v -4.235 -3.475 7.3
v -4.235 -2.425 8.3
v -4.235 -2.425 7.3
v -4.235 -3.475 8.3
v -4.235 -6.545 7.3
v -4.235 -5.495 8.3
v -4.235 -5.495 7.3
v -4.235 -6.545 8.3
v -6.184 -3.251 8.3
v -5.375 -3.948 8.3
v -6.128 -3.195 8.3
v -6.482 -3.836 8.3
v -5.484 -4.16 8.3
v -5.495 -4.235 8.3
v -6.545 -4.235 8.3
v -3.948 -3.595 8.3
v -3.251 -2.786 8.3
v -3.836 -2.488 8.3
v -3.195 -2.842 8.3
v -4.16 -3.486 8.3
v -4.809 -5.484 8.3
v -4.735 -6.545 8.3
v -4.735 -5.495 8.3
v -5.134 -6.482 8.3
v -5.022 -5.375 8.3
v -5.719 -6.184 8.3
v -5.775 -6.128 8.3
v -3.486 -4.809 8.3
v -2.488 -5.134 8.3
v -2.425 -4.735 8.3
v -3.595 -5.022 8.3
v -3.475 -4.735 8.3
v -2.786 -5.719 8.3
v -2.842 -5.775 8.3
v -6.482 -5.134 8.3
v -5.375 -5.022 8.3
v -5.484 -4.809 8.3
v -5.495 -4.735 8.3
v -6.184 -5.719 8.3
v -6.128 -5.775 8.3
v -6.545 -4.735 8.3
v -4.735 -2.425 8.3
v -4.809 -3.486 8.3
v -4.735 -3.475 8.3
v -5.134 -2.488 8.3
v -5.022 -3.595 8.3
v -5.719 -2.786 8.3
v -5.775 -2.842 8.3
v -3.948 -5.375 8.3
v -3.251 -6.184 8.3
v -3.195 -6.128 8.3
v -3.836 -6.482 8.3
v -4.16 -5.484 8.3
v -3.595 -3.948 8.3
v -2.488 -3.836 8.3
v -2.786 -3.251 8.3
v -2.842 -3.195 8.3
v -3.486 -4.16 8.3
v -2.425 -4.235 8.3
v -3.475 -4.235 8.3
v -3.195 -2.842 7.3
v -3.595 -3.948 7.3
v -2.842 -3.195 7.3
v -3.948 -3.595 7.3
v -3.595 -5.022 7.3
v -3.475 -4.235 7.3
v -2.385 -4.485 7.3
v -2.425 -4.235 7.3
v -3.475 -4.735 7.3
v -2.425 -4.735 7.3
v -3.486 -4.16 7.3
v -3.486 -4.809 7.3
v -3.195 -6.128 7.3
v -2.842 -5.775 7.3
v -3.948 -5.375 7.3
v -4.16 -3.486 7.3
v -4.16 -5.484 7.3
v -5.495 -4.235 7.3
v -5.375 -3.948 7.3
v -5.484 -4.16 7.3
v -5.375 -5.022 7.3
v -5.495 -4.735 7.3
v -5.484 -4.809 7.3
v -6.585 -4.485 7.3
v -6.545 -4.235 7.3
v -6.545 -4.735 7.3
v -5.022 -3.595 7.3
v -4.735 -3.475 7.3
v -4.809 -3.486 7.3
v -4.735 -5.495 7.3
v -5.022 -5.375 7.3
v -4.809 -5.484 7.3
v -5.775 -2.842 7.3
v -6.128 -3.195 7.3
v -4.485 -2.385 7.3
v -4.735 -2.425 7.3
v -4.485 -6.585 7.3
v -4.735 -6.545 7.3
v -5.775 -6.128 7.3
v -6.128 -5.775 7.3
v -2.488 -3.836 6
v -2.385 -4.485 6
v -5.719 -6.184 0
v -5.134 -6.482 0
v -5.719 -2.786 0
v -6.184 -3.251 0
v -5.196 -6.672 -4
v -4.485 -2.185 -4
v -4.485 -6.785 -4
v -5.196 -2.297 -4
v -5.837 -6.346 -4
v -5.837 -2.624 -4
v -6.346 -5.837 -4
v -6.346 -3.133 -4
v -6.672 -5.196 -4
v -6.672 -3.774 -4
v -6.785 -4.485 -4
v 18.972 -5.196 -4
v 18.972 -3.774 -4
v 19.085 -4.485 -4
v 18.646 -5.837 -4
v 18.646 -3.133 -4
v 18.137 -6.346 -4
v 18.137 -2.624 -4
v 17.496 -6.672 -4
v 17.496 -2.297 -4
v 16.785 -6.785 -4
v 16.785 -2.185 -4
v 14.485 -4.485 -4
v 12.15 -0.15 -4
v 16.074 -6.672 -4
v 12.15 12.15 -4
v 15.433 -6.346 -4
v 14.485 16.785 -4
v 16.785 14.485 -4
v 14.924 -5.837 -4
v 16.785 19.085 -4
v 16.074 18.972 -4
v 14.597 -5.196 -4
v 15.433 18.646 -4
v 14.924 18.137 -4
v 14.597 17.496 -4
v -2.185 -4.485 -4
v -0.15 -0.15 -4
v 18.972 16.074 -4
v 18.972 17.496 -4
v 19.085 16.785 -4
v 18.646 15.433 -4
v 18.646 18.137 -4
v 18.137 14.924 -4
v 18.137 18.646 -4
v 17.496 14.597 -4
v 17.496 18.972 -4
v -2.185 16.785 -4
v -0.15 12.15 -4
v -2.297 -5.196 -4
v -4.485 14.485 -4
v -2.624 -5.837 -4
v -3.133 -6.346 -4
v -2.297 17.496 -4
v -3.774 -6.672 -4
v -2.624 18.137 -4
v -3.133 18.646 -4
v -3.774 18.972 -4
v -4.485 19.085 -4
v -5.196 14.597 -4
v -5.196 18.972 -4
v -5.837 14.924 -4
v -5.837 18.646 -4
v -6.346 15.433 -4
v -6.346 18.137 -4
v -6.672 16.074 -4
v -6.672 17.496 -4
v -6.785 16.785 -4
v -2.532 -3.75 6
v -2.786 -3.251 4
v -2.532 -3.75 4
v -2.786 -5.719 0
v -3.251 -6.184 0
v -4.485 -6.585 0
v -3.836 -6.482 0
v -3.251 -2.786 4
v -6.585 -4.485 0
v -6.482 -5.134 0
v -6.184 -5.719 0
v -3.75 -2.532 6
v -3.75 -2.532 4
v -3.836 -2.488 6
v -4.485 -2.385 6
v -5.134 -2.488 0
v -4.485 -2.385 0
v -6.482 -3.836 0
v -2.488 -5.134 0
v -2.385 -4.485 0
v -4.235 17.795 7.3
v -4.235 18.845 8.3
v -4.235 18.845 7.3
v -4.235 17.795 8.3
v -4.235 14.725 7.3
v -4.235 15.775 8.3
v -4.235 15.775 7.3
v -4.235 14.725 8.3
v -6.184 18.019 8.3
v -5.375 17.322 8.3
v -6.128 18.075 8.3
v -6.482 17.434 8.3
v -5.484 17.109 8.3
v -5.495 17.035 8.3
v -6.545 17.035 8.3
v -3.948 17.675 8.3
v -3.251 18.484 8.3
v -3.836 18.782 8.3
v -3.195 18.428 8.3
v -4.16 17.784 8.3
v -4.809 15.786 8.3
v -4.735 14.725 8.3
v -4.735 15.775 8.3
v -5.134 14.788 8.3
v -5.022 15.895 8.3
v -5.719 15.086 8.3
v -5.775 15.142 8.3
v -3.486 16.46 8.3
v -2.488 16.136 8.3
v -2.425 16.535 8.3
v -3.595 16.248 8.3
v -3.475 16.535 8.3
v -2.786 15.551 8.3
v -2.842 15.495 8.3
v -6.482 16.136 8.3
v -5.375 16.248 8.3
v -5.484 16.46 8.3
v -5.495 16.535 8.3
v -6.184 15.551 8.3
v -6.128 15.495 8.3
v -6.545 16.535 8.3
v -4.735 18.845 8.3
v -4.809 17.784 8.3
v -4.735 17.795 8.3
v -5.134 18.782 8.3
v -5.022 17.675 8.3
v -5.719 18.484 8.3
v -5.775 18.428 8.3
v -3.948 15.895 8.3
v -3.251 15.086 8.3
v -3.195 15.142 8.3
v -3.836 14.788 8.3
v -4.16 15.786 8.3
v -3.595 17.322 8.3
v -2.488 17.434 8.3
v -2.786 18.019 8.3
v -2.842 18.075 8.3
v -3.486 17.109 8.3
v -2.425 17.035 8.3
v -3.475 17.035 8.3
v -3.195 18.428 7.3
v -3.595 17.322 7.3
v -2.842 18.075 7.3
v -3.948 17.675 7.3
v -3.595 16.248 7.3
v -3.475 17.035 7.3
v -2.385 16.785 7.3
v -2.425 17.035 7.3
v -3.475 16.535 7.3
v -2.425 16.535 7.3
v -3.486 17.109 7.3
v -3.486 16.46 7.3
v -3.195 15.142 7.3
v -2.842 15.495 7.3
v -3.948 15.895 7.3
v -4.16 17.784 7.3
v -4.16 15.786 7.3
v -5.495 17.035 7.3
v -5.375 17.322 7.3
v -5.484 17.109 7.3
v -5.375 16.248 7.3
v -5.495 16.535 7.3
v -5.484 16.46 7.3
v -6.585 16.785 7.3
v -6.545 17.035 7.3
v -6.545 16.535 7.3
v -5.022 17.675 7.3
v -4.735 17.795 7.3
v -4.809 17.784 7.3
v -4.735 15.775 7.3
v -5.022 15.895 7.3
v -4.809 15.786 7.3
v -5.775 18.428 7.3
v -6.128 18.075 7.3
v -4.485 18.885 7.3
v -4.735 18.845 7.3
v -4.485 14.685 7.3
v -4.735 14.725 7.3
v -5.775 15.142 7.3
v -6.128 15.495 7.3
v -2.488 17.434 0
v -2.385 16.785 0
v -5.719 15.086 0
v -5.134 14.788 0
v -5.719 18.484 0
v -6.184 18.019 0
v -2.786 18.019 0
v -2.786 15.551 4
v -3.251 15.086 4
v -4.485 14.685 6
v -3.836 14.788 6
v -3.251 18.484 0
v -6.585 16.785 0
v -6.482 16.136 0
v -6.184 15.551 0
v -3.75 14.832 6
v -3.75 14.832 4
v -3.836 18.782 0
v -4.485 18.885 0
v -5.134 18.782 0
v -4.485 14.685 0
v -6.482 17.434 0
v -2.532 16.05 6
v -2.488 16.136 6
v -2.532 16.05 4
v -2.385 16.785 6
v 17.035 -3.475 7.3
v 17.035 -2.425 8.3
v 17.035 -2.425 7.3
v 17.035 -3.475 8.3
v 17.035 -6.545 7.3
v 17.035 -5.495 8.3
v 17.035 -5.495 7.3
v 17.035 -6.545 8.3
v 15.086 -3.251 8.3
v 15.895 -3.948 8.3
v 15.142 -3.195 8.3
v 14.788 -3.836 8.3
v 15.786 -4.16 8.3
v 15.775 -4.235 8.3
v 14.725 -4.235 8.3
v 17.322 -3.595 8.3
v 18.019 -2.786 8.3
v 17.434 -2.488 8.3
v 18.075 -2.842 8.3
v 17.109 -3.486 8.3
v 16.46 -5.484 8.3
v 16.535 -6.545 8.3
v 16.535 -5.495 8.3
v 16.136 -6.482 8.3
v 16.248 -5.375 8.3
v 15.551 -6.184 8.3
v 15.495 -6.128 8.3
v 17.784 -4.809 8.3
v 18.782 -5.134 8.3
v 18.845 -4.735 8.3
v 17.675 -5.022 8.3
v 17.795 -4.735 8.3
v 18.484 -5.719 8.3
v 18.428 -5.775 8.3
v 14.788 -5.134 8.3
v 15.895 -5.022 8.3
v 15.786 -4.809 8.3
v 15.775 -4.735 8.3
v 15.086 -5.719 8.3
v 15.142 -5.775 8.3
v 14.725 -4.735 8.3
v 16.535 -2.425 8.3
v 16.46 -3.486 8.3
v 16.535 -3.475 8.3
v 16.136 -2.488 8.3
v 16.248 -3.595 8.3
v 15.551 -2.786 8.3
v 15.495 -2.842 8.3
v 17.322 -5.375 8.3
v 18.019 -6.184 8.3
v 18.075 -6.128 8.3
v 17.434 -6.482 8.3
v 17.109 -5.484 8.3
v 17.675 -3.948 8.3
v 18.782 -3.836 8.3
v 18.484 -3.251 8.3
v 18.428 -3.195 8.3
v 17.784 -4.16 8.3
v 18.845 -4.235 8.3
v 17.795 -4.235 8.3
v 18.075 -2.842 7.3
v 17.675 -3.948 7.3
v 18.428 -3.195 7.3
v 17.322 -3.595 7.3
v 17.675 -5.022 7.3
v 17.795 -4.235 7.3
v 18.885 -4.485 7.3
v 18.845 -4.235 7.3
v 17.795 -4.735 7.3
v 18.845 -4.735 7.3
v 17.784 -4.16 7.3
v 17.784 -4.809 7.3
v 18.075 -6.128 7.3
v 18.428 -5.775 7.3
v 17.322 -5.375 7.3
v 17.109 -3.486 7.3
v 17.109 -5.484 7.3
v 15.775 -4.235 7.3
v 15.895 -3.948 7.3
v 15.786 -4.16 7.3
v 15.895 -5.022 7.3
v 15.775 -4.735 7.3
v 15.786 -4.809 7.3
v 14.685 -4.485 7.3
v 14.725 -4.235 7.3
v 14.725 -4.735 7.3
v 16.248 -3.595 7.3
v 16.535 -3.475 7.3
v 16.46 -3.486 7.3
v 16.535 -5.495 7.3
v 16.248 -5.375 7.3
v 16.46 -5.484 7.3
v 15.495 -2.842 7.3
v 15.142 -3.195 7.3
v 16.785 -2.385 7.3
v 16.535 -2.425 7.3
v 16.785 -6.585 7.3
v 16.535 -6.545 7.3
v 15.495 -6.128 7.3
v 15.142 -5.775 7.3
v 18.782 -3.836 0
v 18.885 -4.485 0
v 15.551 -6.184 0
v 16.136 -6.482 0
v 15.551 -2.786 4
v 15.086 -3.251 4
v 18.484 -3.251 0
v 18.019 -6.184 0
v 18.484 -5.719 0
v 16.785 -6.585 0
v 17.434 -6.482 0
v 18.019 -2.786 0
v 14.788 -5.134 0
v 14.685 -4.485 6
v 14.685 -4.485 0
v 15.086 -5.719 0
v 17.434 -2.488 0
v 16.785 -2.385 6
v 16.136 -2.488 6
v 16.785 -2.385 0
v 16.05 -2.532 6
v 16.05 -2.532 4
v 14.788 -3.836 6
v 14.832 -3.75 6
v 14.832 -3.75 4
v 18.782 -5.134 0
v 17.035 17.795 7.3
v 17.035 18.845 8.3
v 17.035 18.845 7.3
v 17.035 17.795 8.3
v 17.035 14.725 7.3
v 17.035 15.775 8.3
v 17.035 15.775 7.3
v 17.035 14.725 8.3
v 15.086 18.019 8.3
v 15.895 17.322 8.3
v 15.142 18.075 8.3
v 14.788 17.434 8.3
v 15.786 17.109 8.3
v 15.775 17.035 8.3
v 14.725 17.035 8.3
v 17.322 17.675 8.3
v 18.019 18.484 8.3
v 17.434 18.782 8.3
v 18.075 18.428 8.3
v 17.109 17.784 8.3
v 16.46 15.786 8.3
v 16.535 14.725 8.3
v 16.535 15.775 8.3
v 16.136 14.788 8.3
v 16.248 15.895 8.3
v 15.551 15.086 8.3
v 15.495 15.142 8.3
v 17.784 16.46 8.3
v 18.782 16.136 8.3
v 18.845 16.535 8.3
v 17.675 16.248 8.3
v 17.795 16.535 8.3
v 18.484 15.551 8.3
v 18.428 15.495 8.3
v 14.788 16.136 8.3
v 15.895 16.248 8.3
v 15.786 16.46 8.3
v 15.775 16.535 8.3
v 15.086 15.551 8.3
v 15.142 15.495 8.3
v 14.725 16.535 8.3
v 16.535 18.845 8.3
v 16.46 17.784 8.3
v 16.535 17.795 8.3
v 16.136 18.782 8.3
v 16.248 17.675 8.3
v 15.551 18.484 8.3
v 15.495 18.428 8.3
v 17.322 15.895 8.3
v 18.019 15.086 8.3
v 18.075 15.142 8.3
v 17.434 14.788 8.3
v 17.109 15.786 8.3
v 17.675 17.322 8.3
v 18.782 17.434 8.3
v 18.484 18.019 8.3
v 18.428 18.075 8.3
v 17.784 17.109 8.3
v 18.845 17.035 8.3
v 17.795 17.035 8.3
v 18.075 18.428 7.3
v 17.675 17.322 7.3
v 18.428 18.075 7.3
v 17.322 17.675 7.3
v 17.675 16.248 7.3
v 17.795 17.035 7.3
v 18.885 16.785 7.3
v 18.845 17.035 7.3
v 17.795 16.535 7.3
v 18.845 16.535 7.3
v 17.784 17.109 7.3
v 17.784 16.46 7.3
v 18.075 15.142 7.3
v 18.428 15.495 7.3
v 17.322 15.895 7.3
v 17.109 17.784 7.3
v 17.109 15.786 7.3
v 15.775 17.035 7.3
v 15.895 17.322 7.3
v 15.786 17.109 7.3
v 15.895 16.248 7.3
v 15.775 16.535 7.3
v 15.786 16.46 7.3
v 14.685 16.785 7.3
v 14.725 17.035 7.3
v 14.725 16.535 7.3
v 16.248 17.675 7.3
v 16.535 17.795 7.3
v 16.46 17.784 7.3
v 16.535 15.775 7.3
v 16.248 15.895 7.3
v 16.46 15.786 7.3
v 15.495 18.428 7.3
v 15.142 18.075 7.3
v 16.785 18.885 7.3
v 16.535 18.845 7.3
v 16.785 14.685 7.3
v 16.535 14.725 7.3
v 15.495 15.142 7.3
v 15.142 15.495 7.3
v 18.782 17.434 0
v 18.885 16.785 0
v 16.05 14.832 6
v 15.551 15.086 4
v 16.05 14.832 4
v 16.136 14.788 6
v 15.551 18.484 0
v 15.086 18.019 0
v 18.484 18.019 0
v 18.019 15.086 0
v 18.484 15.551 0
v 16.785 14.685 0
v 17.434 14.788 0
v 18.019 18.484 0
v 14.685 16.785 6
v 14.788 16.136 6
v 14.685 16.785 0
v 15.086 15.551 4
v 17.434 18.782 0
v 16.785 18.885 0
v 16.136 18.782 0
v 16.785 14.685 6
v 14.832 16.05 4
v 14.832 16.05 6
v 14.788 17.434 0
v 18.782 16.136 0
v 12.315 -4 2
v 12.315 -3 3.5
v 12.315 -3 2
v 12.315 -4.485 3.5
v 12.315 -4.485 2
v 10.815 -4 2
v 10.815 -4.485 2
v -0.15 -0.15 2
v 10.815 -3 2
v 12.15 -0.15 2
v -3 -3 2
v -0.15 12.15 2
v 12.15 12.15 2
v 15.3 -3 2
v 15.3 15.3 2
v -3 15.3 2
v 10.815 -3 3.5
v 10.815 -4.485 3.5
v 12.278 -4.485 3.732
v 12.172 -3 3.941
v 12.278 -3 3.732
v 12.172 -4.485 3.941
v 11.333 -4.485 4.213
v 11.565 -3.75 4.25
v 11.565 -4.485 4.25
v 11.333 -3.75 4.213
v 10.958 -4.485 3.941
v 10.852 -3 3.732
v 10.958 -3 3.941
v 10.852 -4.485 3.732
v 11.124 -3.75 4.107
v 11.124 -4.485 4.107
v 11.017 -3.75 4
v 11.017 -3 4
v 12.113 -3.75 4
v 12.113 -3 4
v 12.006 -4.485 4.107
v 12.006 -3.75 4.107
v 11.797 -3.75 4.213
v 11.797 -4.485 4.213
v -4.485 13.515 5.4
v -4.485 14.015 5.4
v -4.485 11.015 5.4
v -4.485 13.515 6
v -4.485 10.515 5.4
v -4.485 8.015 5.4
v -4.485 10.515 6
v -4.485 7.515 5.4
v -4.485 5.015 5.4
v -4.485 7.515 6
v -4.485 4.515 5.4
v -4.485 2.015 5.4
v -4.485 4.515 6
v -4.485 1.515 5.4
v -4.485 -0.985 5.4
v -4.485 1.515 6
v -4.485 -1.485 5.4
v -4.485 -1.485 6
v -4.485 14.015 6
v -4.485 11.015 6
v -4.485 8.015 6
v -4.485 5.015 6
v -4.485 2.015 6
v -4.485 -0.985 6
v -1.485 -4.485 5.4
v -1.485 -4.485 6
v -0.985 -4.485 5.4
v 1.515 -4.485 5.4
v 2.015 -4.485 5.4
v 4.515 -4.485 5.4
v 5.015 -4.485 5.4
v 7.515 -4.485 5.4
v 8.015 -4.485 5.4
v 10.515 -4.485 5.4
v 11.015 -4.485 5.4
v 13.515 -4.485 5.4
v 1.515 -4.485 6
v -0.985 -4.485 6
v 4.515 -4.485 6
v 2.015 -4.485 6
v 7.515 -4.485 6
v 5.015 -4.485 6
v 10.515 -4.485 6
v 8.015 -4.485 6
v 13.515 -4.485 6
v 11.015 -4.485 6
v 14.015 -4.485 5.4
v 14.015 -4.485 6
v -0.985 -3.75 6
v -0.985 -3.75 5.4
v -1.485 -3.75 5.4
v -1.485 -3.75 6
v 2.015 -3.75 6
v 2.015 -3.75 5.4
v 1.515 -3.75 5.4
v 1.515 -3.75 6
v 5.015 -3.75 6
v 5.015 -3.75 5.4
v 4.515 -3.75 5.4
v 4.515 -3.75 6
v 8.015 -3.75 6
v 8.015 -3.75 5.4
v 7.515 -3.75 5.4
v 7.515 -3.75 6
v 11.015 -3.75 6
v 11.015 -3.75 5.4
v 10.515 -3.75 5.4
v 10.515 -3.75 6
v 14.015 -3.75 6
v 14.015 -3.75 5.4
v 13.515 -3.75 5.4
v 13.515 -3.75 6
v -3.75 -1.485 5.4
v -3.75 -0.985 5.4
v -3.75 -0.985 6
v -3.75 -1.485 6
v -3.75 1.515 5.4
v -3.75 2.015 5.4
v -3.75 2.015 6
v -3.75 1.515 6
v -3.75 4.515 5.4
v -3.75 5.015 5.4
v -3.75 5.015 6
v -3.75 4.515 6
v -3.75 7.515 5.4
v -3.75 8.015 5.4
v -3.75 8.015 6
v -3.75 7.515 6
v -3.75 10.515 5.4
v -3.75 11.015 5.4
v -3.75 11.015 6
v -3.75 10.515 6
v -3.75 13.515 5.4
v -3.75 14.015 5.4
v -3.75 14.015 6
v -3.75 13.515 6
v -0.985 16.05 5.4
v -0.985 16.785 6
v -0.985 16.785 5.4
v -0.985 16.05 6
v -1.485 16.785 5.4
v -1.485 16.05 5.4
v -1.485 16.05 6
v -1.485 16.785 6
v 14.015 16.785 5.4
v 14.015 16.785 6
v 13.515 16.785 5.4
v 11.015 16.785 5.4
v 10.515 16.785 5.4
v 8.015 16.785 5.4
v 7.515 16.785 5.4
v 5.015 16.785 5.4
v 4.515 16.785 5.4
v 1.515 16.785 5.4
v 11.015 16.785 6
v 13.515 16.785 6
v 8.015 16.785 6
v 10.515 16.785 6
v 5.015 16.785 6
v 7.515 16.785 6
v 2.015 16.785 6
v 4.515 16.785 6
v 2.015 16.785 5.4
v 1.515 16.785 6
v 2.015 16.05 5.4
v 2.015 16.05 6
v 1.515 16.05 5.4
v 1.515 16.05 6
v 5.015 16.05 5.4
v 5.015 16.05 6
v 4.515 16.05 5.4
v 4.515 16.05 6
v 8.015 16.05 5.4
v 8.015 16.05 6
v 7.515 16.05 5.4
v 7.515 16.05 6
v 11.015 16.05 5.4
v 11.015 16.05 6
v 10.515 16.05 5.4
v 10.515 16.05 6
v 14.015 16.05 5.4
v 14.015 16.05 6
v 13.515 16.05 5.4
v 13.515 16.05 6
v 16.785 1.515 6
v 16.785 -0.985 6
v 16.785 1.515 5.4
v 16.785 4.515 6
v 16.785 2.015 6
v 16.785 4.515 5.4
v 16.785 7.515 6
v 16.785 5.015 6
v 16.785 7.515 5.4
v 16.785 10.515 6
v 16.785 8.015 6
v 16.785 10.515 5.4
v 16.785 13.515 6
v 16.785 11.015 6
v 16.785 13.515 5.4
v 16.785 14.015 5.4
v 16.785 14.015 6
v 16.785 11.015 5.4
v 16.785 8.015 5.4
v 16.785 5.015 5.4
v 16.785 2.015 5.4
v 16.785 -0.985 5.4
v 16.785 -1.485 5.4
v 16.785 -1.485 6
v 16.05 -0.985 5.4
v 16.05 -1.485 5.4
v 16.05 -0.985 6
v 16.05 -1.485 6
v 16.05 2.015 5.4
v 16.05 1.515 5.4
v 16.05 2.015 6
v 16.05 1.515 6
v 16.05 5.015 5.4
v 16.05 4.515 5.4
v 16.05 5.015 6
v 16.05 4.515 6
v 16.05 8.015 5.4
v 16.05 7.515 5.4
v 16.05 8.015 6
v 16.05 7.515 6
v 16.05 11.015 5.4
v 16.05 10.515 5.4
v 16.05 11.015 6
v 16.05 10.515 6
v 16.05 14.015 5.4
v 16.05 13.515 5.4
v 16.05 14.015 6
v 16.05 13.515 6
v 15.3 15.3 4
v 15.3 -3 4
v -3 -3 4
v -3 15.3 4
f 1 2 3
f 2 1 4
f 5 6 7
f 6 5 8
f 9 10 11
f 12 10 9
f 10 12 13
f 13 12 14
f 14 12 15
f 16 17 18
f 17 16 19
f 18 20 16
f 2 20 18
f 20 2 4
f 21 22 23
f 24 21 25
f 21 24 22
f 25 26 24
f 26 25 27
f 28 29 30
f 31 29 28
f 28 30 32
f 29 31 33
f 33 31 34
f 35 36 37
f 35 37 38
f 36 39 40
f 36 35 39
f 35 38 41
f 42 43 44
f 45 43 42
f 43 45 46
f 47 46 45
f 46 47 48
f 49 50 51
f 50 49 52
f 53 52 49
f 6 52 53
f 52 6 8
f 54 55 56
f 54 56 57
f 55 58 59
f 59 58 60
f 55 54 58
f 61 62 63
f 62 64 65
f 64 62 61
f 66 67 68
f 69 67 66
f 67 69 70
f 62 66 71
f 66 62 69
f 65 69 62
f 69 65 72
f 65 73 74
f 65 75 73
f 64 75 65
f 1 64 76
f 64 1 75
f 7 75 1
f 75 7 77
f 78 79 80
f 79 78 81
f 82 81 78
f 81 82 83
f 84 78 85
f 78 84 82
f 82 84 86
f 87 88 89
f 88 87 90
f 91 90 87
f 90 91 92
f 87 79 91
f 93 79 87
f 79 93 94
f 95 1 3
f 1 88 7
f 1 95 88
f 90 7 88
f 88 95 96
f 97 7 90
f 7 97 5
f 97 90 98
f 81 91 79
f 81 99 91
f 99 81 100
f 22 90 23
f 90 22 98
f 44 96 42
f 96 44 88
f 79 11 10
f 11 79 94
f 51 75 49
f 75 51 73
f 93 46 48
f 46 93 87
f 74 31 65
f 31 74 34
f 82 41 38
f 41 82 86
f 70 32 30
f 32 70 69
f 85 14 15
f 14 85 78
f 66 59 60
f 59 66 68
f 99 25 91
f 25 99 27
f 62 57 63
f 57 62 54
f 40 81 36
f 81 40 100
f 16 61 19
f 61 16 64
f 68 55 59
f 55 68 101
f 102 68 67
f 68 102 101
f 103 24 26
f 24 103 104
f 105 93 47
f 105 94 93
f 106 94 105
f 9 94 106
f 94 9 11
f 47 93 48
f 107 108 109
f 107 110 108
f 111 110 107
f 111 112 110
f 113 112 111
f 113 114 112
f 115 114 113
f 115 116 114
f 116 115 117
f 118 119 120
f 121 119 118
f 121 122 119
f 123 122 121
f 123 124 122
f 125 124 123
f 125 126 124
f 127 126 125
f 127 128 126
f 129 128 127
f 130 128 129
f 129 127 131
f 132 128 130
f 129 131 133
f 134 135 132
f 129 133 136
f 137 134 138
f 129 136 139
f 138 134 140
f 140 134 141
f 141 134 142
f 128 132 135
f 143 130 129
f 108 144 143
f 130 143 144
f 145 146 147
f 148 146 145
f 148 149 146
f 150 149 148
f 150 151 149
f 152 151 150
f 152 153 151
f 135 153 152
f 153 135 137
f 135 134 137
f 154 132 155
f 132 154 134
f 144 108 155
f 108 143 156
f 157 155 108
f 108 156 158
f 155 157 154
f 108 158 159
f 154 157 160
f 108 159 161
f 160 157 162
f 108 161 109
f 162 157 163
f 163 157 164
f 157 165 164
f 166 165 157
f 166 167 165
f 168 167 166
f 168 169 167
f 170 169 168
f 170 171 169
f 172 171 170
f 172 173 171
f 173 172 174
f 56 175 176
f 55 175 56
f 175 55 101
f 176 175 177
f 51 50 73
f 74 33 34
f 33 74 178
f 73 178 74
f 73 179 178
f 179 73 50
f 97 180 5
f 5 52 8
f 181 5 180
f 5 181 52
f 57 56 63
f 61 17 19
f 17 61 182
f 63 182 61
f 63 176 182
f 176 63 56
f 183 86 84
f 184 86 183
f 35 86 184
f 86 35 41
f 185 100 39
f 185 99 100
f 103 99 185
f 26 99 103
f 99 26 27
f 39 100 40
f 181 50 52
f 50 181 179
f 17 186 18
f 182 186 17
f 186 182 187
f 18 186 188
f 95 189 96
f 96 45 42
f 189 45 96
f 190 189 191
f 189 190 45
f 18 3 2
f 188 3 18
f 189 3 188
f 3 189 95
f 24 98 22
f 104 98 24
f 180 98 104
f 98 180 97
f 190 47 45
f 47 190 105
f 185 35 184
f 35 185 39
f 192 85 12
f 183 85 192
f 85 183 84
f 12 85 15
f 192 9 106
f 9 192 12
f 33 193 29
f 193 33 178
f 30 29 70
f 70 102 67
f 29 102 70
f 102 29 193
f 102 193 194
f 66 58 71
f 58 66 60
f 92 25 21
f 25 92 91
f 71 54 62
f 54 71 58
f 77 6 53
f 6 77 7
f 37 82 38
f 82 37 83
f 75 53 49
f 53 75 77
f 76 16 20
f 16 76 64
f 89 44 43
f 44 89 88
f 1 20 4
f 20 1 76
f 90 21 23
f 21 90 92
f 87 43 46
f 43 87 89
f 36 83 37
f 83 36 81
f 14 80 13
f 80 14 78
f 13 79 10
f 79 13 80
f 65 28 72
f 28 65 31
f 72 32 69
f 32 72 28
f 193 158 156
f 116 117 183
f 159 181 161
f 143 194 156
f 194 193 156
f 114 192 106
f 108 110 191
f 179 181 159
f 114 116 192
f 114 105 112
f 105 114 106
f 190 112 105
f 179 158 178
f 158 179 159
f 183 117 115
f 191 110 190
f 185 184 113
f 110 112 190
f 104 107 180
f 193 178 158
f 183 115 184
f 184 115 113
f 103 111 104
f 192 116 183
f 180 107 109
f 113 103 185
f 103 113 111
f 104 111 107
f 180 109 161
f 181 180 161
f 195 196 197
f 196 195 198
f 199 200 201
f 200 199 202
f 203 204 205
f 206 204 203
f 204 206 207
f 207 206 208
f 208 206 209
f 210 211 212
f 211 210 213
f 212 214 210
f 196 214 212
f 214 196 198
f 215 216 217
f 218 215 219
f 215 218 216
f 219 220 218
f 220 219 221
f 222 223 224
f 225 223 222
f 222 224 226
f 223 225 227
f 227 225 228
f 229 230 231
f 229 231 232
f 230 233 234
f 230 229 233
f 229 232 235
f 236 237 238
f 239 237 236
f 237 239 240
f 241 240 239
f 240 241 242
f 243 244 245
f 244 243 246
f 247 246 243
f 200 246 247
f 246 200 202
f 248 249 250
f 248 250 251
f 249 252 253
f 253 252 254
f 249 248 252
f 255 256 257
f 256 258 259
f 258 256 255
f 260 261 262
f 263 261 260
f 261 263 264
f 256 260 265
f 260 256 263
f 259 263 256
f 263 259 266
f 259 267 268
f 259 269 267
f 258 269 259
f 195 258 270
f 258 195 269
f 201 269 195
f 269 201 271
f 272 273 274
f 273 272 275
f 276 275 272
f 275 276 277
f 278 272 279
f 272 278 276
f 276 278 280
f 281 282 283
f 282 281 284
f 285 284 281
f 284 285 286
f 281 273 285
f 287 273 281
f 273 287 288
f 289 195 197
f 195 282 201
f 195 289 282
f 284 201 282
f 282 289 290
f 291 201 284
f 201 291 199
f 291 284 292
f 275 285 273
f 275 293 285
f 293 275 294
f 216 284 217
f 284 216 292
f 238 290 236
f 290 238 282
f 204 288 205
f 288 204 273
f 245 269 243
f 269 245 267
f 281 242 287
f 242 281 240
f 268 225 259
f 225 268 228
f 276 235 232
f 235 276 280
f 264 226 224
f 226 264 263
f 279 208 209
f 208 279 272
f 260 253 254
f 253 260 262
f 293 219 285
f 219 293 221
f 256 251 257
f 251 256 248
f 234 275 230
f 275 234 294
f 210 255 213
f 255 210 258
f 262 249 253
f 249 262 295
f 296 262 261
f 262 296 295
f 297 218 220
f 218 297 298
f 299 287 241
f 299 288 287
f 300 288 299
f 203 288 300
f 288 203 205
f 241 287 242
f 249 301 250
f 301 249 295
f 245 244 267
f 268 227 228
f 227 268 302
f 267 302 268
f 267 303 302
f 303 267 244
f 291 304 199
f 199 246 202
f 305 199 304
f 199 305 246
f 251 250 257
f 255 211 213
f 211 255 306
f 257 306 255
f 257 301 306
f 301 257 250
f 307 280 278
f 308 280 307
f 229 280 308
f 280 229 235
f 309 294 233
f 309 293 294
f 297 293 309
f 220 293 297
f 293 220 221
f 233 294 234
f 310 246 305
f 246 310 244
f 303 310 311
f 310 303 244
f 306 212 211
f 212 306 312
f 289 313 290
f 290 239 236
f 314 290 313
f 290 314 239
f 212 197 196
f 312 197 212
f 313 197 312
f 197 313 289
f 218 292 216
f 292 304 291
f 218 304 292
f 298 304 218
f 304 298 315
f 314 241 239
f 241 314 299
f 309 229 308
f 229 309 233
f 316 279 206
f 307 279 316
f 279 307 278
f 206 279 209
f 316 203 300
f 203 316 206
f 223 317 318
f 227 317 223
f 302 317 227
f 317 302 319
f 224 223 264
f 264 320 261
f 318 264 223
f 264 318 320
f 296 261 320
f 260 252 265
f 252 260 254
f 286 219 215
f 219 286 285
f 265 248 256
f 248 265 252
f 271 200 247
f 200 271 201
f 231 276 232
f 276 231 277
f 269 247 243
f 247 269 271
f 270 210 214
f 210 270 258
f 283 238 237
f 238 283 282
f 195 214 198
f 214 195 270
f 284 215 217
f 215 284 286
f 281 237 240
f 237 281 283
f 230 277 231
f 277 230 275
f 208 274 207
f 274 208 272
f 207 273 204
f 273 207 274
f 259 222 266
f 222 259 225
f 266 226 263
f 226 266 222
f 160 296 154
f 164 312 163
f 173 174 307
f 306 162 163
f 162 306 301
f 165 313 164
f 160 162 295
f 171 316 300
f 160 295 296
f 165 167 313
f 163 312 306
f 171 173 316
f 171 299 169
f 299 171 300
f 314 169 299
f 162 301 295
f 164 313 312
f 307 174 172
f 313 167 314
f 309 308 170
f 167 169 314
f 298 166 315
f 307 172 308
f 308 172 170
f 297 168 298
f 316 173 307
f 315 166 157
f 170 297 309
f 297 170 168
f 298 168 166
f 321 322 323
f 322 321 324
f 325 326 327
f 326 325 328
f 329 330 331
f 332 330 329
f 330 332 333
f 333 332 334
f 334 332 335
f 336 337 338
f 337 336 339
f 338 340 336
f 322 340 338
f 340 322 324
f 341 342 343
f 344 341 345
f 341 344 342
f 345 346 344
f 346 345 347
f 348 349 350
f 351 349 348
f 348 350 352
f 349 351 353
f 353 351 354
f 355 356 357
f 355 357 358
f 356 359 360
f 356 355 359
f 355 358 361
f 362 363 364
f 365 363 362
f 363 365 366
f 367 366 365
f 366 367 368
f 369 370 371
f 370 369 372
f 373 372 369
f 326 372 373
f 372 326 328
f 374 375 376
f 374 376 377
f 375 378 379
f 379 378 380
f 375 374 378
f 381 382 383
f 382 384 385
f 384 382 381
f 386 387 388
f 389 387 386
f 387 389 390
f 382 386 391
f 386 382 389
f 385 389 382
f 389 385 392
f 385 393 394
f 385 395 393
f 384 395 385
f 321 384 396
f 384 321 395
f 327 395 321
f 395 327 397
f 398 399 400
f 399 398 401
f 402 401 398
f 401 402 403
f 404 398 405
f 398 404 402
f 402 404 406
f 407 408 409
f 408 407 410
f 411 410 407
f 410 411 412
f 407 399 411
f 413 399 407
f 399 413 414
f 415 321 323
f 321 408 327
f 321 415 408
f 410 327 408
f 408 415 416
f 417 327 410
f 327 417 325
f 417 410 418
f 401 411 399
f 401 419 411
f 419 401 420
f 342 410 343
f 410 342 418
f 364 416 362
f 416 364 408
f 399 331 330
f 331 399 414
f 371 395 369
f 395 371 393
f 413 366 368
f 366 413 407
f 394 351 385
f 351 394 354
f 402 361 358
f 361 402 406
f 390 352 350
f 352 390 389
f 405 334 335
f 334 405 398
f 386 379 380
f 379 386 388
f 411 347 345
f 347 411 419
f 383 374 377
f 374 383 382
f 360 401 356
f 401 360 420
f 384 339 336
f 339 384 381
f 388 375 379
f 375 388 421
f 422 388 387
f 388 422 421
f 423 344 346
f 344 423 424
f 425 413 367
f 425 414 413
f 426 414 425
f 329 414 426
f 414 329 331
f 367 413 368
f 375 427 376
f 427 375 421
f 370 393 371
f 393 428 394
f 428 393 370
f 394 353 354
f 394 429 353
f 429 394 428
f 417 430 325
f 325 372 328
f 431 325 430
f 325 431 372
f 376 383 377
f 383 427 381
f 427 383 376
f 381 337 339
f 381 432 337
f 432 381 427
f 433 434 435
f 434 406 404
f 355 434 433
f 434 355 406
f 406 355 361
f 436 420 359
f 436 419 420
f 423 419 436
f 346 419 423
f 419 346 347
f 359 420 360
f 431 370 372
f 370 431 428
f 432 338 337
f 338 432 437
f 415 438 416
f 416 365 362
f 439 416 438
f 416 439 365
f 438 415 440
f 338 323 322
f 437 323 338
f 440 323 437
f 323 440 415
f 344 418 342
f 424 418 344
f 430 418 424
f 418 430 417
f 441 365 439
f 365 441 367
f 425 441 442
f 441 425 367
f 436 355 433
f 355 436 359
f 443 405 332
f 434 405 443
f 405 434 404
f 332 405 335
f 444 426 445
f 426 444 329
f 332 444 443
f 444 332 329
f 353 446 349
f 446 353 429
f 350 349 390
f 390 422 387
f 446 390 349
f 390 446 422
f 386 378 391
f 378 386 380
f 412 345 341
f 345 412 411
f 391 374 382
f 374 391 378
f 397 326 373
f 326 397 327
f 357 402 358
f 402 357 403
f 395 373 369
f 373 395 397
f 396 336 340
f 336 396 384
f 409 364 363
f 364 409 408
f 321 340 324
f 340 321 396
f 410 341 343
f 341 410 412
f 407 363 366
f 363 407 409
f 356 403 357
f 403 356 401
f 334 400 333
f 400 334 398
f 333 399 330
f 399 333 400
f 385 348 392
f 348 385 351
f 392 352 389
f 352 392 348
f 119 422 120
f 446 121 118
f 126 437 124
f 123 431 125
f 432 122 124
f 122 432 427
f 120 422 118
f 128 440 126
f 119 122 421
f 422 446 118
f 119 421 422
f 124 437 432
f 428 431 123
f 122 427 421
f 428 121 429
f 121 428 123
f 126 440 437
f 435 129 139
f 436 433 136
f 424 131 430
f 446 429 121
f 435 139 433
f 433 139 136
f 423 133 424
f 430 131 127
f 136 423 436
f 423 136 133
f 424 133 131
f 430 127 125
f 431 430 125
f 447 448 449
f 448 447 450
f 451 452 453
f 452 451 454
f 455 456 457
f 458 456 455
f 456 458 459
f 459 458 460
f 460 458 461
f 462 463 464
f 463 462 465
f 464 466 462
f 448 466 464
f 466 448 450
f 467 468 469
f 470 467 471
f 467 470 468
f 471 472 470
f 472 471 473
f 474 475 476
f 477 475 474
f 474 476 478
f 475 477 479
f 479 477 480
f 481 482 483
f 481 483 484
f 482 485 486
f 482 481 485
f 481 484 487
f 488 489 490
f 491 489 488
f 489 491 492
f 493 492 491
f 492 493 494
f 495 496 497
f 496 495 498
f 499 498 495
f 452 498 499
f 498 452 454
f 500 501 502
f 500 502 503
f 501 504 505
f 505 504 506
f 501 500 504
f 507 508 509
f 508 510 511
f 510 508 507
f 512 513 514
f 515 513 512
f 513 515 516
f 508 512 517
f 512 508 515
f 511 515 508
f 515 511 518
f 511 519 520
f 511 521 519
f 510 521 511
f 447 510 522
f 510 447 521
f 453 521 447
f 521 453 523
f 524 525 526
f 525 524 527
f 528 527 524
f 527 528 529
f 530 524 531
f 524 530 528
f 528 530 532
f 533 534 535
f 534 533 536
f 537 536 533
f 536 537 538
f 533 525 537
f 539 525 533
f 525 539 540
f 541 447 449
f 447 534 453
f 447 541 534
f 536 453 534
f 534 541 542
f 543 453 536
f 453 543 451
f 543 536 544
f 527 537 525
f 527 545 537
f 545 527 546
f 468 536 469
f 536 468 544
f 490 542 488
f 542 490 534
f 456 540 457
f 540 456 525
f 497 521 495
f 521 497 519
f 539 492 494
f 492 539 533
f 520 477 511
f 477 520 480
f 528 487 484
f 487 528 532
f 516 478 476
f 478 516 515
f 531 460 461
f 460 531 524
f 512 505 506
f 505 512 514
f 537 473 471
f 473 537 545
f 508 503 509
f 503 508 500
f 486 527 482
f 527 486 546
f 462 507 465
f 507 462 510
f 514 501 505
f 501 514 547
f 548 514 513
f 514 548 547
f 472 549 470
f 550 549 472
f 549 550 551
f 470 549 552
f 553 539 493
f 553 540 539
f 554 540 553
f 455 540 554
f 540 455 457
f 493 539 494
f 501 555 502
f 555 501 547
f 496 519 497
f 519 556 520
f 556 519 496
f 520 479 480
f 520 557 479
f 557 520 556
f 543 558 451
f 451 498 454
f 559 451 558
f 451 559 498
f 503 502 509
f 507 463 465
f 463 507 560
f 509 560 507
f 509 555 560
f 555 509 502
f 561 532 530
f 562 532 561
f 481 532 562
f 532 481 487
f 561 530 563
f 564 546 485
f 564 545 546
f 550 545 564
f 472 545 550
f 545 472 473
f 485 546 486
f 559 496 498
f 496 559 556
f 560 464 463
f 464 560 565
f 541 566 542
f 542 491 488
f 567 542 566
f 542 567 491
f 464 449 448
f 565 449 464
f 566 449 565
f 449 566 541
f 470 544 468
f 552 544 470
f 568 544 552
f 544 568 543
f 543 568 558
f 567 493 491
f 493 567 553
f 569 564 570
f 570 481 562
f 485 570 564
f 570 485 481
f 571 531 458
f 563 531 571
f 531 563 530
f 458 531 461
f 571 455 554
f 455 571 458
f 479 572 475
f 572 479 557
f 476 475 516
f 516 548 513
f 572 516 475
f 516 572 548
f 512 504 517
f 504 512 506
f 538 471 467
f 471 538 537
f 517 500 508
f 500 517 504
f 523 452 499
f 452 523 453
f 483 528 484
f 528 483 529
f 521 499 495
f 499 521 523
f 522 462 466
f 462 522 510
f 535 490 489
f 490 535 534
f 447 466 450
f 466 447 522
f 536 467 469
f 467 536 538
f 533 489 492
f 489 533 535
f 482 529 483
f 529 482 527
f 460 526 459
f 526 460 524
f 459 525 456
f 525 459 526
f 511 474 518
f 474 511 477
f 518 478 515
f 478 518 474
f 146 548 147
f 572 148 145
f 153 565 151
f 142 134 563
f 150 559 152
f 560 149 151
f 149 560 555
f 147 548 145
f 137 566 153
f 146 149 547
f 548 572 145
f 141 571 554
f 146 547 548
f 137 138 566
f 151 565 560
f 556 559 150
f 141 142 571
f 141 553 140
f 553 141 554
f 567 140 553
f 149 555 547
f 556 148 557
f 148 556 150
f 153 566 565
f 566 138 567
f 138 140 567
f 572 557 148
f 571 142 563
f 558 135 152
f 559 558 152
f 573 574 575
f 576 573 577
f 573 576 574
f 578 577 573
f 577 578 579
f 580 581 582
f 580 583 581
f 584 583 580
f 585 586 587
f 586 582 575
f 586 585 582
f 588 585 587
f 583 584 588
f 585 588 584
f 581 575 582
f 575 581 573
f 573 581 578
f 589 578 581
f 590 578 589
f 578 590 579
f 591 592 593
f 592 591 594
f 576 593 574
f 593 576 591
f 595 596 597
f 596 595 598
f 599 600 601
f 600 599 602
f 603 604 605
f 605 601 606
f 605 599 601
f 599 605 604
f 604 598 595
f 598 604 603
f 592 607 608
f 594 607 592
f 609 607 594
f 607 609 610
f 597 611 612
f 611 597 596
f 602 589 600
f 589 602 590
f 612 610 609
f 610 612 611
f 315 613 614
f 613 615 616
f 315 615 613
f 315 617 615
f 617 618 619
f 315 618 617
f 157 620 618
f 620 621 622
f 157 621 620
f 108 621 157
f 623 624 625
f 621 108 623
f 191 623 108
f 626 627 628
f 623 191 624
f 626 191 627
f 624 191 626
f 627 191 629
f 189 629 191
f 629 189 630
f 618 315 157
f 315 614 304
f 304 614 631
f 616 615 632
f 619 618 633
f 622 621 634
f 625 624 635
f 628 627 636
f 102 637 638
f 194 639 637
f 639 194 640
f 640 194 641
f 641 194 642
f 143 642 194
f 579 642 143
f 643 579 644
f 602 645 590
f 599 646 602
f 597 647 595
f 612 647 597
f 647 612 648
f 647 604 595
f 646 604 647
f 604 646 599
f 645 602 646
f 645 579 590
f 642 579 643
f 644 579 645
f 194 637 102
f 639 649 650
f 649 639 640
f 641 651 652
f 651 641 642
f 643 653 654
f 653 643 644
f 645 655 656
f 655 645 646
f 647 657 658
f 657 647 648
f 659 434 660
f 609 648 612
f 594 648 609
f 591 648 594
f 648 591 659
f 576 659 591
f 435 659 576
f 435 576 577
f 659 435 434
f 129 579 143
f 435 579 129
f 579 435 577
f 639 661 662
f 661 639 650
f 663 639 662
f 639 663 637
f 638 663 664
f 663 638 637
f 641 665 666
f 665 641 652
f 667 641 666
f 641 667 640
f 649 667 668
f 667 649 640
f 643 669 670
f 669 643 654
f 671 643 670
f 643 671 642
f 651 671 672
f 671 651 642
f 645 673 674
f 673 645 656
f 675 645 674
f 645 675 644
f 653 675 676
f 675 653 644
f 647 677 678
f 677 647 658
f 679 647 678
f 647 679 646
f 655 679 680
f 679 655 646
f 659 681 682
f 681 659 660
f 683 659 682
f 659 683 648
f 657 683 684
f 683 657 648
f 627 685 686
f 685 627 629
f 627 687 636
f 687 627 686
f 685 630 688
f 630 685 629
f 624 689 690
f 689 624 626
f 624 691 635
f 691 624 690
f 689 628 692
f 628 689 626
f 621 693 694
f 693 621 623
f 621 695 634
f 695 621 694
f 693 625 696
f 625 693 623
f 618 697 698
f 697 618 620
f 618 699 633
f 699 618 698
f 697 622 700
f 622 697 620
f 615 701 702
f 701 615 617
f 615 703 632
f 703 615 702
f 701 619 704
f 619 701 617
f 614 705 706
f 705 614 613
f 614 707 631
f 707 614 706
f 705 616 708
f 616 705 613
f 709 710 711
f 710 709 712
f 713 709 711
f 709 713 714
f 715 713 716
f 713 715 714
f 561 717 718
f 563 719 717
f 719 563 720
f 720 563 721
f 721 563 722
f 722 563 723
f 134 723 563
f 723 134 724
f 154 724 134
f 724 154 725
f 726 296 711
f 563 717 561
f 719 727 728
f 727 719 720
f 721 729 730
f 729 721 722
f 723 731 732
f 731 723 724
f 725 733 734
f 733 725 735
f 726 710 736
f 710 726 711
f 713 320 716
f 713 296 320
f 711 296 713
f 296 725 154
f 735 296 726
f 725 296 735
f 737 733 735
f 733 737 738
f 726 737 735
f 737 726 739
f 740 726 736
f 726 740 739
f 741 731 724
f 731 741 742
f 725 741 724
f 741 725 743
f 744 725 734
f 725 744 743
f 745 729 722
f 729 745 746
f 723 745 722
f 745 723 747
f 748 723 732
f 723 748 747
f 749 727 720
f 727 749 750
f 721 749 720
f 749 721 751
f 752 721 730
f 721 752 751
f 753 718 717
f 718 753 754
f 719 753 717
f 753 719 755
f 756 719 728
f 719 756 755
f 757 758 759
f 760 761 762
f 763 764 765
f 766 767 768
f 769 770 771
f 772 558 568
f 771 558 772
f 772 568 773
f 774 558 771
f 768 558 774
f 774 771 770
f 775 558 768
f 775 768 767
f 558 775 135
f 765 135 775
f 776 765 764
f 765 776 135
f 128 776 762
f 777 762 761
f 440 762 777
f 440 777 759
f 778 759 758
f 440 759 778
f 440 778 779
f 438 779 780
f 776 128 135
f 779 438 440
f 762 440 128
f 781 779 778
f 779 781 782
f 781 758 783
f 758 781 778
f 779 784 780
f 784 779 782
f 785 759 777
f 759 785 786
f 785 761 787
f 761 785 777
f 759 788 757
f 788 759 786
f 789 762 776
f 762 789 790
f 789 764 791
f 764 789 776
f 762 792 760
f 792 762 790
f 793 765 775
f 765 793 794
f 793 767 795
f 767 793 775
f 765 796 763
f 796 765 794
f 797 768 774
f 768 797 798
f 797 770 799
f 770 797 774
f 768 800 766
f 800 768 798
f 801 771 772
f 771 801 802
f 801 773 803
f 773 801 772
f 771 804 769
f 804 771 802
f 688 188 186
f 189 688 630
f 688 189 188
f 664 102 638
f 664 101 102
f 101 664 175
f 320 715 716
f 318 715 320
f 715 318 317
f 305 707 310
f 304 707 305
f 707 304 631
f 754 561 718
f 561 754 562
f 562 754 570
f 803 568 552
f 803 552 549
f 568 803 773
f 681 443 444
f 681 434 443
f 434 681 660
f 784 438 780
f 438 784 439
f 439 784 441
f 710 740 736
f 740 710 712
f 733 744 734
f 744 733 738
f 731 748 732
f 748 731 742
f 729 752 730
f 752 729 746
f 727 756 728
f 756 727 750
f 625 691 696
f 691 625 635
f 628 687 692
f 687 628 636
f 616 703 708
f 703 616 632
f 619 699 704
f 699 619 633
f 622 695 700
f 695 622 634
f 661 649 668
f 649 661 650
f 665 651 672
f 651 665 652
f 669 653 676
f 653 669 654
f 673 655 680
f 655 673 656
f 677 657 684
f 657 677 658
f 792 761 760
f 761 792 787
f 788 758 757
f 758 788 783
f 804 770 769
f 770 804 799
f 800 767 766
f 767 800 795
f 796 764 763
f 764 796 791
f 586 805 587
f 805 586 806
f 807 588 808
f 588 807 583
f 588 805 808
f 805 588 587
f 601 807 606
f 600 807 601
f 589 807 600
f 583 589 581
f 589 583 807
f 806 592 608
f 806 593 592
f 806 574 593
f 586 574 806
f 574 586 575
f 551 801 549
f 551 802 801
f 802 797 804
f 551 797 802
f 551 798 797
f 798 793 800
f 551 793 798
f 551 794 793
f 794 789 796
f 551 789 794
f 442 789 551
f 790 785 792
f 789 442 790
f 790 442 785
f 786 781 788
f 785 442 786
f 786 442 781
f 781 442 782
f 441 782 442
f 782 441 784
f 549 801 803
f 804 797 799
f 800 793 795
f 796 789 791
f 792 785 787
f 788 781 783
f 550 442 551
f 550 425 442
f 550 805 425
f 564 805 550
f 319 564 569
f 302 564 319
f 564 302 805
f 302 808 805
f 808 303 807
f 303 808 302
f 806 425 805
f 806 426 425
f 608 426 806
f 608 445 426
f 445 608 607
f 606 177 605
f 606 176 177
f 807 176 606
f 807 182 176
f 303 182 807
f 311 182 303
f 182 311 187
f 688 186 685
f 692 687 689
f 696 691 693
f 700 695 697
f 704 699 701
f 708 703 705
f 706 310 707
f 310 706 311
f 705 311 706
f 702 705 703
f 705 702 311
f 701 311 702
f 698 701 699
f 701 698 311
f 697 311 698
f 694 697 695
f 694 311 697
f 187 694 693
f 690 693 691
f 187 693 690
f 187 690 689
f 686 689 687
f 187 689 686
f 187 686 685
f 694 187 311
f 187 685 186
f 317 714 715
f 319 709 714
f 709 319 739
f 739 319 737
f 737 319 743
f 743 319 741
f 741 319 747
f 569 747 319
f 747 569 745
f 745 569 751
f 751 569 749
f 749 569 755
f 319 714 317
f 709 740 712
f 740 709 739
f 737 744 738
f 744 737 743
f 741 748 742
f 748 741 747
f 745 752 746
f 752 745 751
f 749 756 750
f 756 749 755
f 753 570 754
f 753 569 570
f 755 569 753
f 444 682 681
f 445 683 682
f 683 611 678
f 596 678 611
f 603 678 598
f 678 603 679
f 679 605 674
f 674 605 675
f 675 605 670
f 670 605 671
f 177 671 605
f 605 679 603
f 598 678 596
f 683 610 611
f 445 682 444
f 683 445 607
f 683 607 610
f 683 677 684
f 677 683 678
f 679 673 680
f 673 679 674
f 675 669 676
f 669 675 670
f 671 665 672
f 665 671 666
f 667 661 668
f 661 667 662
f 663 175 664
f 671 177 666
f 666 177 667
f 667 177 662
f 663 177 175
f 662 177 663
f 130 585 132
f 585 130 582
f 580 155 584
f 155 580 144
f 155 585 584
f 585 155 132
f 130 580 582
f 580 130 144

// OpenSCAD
radio = 4.2/2;
ancho=sqrt(2*radio*radio);
rTH=17; //sqrt(2*pow(2,12.3))/2;
ladoAlmTH = 12.3/15;
dCubo=3+radio*sin(45);//+radio;sqrt(2*3*3);

module torre_homenaje(){
//
	
	difference(){
		cube(size=[12.3,12.3,22.7+4]);
		translate([2/2,2/2,-1])agujeroTH();//cube(size=[12.3-3,12.3-3,22.7-2]);
		translate([12.3/2-1.5/2,-ancho/2,22.7/3*2])
			union(){
				cube(size=[1.5,5,1.5]);
				translate([1.5/2,5,1.5])rotate([90,0,0])lobulada(radio=1.3/2);
			}		
	}
	translate([0,0,22.7+4])almenasTH();


}

module cubo(){
	difference(){
		cylinder(h = 8.30+4, r = radio, center = false, $fn=20);
		for ( i = [0 : 7] )
		{
			rotate([0,0,i*45])translate([0,0,7.8+4])cube(size=[.5,radio*6,1],center=true);
		}
		translate([0,0,7.3+4])cylinder(h = 8.30, r = radio/2, center = false, $fn=20);
	}
	translate([0,0,-0])cylinder(h = 4, r1= radio + .2, r2 = radio, center = false, $fn=20);
}

module muralla(puente=true){
	difference(){
		cube(size=[12.3+dCubo*2,12.3+dCubo*2,6+4]);
		translate([ancho/2,ancho/2,-50])cube(size=[12.3+dCubo*2-ancho,12.3+dCubo*2-ancho,100]);
		translate([ancho/2-0.75,ancho/2-0.75,4+4])cube(size=[12.3+dCubo*2-ancho+1.5,12.3+dCubo*2-ancho+1.5,100]);
		translate([12.3+dCubo*2-ancho-3,-ancho/2,2+4])
			union(){
				cube(size=[1.5,5,1.5]);
				translate([1.5/2,5,1.5])rotate([90,0,0])cylinder(h=5,r=1.5/2,$fn=20);
			}	

		translate([0,0,4])agujerosMuralla();
	}
	
    //puente
    if (puente)
        translate([12.3+dCubo*2-ancho-3,-4.3,1.65+4])rotate([2,0,0])cube(size=[1.5,4.8,0.2]);
}



module castillo(){
    translate([-0.15,-0.15,-4])torre_homenaje();
	castilloSinTorre();

}
module castilloSinTorre(puente=true){
	translate([-dCubo,-dCubo,-4]) cubo();
	translate([-dCubo,12.3 + dCubo,-4]) cubo();
	translate([12.3 + dCubo,-dCubo,-4]) cubo();
	translate([12.3 + dCubo,12.3 + dCubo,-4]) cubo();
	translate([-dCubo,-dCubo,-4])muralla(puente);

    // la tierra entre el cubo y la muralla TODO hacerla paramétrica
    translate([6,6,-1])difference(){
		cube(size=[20,20,6],center=true);
		cube(size=[12.3,12.3,60],center=true);
	}

}

module almenaTH(){
	cube(size=[ladoAlmTH,ladoAlmTH,1]);
	polyhedron(
  points=[ [0,0,1],[ladoAlmTH,0,1],[ladoAlmTH,ladoAlmTH,1],[0,ladoAlmTH,1], // the four points at base
           [ladoAlmTH/2,ladoAlmTH/2,1.7]  ],                                 // the apexont 
faces=[ [0,1,4],[1,2,4],[2,3,4],[3,0,4],          // each triangle side
              [1,0,3],[2,1,3] ]                         // two triangles for square base

 );

}

module almenasTH(){
		for ( i = [0 : 7] )
	{
    		translate([0, i*2*ladoAlmTH, 0])
    		almenaTH();
	}


		for ( i = [0 : 2] )
	{
    		translate([i*2*ladoAlmTH,0, 0])
    		almenaTH();
	}

		for ( i = [5 : 7] )
	{
    		translate([i*2*ladoAlmTH,0, 0])
    		almenaTH();
	}
		for ( i = [0 : 7] )
	{
    		translate([7*2*ladoAlmTH, i*2*ladoAlmTH, 0])
    		almenaTH();
	}
		for ( i = [0 : 7] )
	{
    		translate([i*2*ladoAlmTH,7*2*ladoAlmTH, 0])
    		almenaTH();
	}

}

module agujerosMuralla(){
		for ( i = [0 : 7] )
	{
    		translate([ 3*i,0, 5.4])
    		cube(size=[0.5,2,0.8]);
	}
		for ( i = [0 : 7] )
	{
    		translate([ 0,3*i, 5.4])
    		cube(size=[2,0.5,0.8]);
	}
		for ( i = [0 : 7] )
	{
    		translate([ 3*i,12.3+dCubo*2-2, 5.4])
    		cube(size=[0.5,2,0.8]);
	}
		for ( i = [0 : 7] )
	{
    		translate([ 12.3+dCubo*2-2,3*i, 5.4])
    		cube(size=[2,0.5,0.8]);
	}
}

module lobulada(radio=1.5/2,n=8){

	cylinder(h=5,r=radio,$fn=20);
	for ( i = [-90 : 180/n:90] )
	{
    		translate([ radio*sin(i),radio*cos(i), ])
    		cylinder(h=5,r=radio*1.5/n,$fn=20);
	}

}
module tierra(){
	difference(){
		import("../CastillNogales_directo_ext_rev_repaired.stl");
		/*rotate([0,0,45])translate([70+20,0,0])cube(size=[140,140,140],center=true);
		rotate([0,0,45])translate([-70-20,0,0])cube(size=[140,140,140],center=true);
		rotate([0,0,45])translate([0,70+20,0])cube(size=[140,140,140],center=true);
		rotate([0,0,45])translate([0,-70-20,0])cube(size=[140,140,140],center=true);
		translate([0,0,-75])cube(size=[140,140,140],center=true);*/
		difference(){
			cube(size=[110,1000,50],center=true);
			rotate([0,0,55])translate([-14,-14,0])minkowski(){
				cube(size=[27,27,10],center=true);
				translate([14,14,0])cylinder(r=3,h=5,$fn=20);

			}

		}
		rotate([0,0,55])translate([-9,-9,0])minkowski(){
			cube(size=[25,25,5],center=true);
			translate([9,9,0])cylinder(r=2,h=5,$fn=20);

		}
		rotate([0,0,55])cube(size=[12,12,60],center=true);
	}
	/*rotate([0,0,55])difference(){
		cube(size=[20,20,3.5],center=true);
		cube(size=[11,11,60],center=true);
	}*/
	
//import("CastillNogales_directo_ext_rev_repaired.stl");
}

module agujeroTH(){
	radioSphera= (12.3-2)/2;
	intersection(){
		cube(size=[12.3-2,12.3-2,22.7-radioSphera+4]);
		translate([radioSphera-.1,radioSphera-.1,-radioSphera+4])cylinder(h = 22.7, r2 = (12.3-2)/2, r1 = 12.3-2, center = false, $fn=20);
	}
	translate([radioSphera-.1,radioSphera-.1,22.7-radioSphera+4])sphere(r = radioSphera);
}


module base(){
	anchoBase =30;
	desp = anchoBase/2 - 12.3/2;
	difference(){
		translate([-desp,-desp,-.5])cube(size=[anchoBase,anchoBase,.51]);
		translate([2/2,2/2,-5])cube(size=[12.3-3,12.3-3,22.7-2]);
	}
}



module tierraSinCastillo(){
    difference(){
        rotate([0,0,-55])tierra();
        scale([1.01,1.01,1])translate([-12.3/2,-12.3/2,0])castillo();
        
        }
}



//translate([-12.3/2,-12.3/2,0])castillo();
//tierraSinCastillo();
//translate([-12.3/2,-12.3/2,0])%color("red")
castilloSinTorre(false);
//scale([0.99,0.99,1])translate([-12.6/2,-12.6/2,-4])
//torre_homenaje();
// puente
//color("blue")
//cube(size=[1.5,4.8,0.2]);
